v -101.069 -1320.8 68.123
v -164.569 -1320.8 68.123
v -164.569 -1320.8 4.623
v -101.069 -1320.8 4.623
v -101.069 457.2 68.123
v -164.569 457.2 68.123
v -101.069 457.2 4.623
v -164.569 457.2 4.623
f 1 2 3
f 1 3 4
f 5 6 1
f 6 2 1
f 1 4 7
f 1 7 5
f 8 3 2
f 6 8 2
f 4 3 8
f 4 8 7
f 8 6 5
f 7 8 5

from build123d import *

# Parameters (mm, degrees)
F0_W     = 63.5
F0_H     = 63.5
F1_DEPTH = 1498.6
F2_DEPTH = 1092.2
F3_DEPTH = 203.2
F4_DEPTH = 177.8
F5_DEPTH = 1117.6
F6_DEPTH = 635


with BuildPart() as f1:
    # F0 (on Front) → F1 (new body)
    with BuildSketch(Plane.XZ):
        with Locations((-132.8186606169, 36.3734573238)):
            Rectangle(F0_W, F0_H)
    extrude(amount=F1_DEPTH)

    # F2 (cut): a face of the model
    f2_faces = [f1.faces().sort_by_distance(p)[0] for p in [
        (-132.8186606169, 0, 36.3734573238),
    ]]
    extrude(f2_faces, amount=-F2_DEPTH, mode=Mode.SUBTRACT)

    # F3 (cut): a face of the model
    f3_faces = [f1.faces().sort_by_distance(p)[0] for p in [
        (-132.8186606169, -1092.2, 36.3734573238),
    ]]
    extrude(f3_faces, amount=-F3_DEPTH, mode=Mode.SUBTRACT)

    # F4 (cut): a face of the model
    f4_faces = [f1.faces().sort_by_distance(p)[0] for p in [
        (-132.8186606169, -1498.6, 36.3734573238),
    ]]
    extrude(f4_faces, amount=-F4_DEPTH, mode=Mode.SUBTRACT)

    # F5 (add): a face of the model
    f5_faces = [f1.faces().sort_by_distance(p)[0] for p in [
        (-132.8186606169, -1295.4, 36.3734573238),
    ]]
    extrude(f5_faces, amount=F5_DEPTH)

    # F6 (add): a face of the model
    f6_faces = [f1.faces().sort_by_distance(p)[0] for p in [
        (-132.8186606169, -177.8, 36.3734573238),
    ]]
    extrude(f6_faces, amount=F6_DEPTH)


solid = f1.part
